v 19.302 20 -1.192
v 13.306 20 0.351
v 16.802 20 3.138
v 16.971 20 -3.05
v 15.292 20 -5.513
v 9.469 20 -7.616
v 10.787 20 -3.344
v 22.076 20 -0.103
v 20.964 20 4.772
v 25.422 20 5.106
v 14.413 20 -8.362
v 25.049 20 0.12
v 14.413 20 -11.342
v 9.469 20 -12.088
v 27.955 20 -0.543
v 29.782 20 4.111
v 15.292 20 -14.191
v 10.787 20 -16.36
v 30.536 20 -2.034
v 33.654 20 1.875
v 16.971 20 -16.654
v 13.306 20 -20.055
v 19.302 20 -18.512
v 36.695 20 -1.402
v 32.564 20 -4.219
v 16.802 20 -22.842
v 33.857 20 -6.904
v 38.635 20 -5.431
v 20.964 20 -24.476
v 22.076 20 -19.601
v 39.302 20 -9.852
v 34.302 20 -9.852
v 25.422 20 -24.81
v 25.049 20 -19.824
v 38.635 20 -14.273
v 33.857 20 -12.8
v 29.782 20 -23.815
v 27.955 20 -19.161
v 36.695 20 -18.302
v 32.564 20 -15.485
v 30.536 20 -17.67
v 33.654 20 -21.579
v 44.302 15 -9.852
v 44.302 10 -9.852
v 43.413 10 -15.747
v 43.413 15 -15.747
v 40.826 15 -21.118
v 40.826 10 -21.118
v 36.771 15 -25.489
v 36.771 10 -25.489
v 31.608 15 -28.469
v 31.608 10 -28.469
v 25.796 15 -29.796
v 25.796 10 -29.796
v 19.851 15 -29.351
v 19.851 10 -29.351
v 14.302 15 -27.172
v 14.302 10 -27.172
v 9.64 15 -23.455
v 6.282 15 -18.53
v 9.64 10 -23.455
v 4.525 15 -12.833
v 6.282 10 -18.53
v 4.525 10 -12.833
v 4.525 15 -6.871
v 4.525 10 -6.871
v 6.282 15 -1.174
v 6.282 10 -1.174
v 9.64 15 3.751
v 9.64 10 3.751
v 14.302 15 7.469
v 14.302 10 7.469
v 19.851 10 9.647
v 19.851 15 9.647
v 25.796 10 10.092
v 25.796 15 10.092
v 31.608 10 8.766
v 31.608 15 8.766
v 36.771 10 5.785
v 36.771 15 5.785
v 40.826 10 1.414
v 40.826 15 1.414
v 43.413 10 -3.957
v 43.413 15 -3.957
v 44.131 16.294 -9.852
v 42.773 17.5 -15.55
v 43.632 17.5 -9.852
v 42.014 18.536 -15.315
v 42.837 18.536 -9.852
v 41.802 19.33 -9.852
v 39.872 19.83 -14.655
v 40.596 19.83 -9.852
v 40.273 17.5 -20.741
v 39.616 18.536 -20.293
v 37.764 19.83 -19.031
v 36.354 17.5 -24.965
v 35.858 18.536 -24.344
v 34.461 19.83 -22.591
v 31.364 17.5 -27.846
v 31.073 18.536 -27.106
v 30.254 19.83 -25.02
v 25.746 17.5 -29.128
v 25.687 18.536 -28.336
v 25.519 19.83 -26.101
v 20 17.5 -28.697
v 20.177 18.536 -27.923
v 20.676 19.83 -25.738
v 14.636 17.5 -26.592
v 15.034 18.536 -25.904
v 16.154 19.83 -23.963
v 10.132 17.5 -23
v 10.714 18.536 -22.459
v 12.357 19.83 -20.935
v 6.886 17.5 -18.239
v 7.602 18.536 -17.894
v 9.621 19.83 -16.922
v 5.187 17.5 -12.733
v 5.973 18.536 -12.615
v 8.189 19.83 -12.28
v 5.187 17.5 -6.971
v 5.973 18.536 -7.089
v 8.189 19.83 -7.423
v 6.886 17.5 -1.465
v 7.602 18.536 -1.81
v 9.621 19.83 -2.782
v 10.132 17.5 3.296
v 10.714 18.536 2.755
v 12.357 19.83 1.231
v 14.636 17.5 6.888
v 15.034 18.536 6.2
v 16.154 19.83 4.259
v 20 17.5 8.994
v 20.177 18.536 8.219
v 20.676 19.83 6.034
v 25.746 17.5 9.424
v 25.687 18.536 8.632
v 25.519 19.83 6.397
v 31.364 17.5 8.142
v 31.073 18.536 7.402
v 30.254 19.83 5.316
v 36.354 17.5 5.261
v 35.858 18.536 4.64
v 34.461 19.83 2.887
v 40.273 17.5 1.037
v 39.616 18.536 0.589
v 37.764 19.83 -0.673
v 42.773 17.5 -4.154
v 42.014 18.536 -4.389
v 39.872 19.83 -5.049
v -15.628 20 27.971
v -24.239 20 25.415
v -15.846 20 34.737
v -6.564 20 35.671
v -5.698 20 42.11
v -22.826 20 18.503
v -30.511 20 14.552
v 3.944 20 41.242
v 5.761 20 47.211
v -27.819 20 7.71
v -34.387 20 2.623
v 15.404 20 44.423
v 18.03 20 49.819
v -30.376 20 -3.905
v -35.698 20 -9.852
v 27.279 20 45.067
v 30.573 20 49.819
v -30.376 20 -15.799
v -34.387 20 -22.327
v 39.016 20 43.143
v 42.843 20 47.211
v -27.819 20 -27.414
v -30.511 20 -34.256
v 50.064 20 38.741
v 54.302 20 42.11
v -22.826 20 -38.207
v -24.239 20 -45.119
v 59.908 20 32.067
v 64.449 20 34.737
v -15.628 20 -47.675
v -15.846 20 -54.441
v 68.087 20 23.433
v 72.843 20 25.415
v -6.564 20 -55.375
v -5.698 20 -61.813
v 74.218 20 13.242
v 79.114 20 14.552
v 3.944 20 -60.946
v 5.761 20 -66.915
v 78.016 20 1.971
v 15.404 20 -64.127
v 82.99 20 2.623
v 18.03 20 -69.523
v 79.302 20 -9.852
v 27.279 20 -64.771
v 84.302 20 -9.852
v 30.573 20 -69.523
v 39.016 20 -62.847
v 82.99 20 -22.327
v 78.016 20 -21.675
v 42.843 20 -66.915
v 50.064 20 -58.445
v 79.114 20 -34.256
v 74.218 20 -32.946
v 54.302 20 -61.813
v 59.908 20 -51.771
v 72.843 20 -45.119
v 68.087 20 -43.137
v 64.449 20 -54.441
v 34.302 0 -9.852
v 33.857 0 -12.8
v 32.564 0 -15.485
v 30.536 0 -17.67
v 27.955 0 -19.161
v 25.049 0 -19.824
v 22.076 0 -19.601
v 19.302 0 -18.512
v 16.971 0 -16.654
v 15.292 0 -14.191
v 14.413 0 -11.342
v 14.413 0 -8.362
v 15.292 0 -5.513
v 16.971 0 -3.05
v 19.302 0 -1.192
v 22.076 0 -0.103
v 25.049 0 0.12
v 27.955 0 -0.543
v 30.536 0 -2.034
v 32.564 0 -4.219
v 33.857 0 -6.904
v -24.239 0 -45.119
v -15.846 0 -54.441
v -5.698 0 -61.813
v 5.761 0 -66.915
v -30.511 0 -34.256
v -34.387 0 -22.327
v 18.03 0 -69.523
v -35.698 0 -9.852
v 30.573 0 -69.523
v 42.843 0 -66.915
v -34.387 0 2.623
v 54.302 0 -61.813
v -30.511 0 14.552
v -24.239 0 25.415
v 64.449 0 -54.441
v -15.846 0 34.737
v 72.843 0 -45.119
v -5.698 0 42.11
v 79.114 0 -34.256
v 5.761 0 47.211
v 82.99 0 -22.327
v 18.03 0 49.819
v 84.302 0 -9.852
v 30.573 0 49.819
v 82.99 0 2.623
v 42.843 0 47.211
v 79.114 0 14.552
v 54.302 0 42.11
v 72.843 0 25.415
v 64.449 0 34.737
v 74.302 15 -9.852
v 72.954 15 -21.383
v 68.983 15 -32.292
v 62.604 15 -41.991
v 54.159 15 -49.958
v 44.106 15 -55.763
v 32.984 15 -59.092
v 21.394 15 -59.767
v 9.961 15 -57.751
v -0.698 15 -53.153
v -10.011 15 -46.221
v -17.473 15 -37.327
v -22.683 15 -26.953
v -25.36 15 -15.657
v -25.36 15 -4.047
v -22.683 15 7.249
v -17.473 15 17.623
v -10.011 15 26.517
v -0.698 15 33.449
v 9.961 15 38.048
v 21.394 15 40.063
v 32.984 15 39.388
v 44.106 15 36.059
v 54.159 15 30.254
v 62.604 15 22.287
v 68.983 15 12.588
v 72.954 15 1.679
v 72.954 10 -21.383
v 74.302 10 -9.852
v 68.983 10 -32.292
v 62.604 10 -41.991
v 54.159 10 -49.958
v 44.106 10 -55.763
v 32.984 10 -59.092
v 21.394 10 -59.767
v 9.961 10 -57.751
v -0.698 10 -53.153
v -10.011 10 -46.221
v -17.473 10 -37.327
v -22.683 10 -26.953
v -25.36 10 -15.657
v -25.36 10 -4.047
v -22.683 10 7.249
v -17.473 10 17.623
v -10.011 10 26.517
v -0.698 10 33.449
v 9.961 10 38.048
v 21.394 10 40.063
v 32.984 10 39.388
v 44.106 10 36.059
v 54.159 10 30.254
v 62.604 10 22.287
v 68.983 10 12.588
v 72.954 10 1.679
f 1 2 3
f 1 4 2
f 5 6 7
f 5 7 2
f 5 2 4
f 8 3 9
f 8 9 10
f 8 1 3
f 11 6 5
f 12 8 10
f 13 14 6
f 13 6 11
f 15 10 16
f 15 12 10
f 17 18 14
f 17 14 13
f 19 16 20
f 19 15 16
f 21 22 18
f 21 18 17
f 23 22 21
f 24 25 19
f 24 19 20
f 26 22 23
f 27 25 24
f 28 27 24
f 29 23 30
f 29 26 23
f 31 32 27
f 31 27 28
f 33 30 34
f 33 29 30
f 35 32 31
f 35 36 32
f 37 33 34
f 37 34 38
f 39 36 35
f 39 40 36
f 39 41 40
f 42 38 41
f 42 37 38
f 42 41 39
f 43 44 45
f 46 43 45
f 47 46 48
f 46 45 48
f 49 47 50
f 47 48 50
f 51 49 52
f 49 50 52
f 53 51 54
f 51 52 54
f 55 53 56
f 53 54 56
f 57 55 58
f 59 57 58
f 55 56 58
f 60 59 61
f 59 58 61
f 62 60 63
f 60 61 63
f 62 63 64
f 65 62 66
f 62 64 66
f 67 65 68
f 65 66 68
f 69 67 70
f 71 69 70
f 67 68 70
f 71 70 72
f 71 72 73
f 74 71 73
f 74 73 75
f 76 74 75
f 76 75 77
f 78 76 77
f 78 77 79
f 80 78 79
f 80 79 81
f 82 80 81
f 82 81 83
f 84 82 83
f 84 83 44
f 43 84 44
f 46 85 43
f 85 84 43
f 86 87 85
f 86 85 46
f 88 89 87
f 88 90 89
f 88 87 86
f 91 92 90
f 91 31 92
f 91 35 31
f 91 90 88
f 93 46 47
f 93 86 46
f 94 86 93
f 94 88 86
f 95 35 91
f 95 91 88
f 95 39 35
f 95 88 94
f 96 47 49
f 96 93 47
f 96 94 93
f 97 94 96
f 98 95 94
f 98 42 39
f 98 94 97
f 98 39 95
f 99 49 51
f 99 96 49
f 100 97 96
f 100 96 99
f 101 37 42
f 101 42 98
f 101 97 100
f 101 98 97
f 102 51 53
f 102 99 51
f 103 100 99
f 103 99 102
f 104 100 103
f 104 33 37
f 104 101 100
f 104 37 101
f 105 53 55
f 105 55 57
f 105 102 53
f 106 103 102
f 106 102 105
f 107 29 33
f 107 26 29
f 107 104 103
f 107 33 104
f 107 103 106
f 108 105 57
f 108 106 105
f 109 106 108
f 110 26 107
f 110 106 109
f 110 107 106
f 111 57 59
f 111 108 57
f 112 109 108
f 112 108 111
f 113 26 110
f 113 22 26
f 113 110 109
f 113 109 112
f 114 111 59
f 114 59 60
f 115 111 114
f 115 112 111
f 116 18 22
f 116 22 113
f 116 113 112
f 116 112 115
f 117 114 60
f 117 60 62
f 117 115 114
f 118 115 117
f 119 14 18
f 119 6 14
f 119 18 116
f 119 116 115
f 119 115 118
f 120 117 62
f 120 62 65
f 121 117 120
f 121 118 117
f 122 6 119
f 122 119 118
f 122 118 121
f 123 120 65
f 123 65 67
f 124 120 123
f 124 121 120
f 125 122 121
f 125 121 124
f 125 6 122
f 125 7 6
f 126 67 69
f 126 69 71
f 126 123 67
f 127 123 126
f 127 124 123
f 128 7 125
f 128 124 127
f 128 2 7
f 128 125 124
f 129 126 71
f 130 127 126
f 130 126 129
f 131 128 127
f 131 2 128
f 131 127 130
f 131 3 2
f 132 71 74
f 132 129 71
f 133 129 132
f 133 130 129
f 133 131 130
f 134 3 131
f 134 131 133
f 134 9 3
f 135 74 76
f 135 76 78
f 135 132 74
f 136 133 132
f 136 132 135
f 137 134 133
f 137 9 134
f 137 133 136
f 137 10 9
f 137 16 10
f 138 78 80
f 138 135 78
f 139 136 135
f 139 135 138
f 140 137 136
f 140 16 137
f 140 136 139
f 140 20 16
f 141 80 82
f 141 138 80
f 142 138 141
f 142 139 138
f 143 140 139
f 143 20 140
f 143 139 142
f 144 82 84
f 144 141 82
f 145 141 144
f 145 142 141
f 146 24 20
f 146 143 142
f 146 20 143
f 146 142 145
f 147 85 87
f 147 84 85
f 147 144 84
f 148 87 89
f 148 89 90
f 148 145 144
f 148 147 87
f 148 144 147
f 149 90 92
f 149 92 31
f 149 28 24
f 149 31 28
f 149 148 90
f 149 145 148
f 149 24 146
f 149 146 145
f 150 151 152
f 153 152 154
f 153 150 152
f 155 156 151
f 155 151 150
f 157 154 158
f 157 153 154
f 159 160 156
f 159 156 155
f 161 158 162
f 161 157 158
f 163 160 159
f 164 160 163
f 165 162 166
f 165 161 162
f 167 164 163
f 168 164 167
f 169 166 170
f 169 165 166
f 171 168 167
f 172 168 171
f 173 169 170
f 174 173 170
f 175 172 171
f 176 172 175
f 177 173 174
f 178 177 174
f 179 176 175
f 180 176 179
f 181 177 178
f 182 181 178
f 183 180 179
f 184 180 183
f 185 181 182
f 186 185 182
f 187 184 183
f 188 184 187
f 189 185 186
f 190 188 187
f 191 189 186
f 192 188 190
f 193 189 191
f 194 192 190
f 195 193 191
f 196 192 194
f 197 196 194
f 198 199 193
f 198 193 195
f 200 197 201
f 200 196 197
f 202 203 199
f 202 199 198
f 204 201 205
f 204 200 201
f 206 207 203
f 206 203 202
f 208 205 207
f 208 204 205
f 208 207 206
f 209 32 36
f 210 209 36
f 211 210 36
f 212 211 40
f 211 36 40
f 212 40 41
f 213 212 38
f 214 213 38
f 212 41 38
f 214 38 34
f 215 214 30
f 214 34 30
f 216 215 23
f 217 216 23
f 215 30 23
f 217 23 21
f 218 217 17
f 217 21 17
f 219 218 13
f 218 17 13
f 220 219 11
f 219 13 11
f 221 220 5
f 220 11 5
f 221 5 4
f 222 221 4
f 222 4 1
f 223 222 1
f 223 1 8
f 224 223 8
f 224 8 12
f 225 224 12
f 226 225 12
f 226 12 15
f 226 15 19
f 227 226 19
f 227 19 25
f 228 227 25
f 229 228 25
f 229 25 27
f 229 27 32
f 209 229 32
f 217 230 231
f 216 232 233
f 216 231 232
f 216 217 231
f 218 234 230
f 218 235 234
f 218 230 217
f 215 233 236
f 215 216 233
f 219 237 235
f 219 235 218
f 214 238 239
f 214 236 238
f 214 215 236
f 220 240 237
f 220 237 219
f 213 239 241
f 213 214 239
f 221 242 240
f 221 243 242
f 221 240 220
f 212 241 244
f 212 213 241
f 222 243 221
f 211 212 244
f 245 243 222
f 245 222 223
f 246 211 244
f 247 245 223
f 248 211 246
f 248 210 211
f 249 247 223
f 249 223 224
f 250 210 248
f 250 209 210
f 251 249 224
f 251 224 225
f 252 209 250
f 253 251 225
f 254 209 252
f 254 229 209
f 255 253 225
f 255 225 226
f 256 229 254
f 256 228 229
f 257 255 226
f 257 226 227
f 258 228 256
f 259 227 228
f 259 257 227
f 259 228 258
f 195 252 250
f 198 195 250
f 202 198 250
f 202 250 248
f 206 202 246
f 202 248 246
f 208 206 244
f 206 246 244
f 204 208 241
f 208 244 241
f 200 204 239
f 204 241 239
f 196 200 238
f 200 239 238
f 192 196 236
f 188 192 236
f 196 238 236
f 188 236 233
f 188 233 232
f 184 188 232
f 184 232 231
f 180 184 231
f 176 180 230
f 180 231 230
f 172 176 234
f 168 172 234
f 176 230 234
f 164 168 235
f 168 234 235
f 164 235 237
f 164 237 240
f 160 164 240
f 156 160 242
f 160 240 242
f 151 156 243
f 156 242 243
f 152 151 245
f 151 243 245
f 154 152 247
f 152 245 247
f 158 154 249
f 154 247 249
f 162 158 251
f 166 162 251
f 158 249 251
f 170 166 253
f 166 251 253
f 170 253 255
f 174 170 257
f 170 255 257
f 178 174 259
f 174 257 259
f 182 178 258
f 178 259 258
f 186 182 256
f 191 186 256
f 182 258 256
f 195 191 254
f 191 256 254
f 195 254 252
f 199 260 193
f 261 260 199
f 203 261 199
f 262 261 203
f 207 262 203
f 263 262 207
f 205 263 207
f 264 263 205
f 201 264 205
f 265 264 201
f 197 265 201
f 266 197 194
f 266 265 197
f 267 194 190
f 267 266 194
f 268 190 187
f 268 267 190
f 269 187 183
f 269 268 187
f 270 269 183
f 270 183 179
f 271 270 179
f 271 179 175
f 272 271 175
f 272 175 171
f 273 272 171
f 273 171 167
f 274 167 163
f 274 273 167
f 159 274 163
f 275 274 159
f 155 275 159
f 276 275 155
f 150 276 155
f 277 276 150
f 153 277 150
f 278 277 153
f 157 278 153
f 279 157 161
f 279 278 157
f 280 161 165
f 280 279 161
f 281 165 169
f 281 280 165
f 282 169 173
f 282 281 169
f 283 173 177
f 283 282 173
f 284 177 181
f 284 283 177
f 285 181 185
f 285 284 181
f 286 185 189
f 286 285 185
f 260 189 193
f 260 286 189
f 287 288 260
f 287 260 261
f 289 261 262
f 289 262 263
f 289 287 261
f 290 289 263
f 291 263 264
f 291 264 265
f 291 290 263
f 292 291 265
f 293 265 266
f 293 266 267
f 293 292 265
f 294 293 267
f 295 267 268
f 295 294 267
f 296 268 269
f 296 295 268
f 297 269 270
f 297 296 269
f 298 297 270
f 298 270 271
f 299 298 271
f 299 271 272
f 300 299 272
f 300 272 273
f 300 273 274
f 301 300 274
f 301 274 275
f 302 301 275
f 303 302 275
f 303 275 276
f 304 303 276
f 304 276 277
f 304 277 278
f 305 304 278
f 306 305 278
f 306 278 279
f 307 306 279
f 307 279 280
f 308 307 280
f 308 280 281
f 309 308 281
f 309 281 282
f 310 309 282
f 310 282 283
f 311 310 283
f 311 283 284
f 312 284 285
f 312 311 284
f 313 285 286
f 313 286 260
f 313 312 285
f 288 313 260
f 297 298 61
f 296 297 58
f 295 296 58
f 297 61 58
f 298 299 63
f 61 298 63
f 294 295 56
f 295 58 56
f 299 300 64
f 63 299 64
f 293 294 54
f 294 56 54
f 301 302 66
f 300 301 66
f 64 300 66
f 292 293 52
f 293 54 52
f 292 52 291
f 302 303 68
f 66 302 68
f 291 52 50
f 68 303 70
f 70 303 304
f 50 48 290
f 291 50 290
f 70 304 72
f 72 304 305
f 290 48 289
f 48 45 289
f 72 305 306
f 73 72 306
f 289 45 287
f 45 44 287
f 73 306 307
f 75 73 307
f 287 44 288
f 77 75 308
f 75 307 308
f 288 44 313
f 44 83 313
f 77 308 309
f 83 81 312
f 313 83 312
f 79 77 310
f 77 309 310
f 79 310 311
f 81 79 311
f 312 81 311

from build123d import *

# Parameters (mm, degrees)
ESQUISSE1_R             = 20
BOSS_EXTRU_1_DEPTH      = 20
ESQUISSE1_R_2           = 60
ESQUISSE1_R_3           = 50
BOSS_EXTRU_1_2_DEPTH    = 20
ESQUISSE2_R             = 50
ESQUISSE2_R_2           = 20
BOSS_EXTRU_2_DEPTH      = 10
CHANFREIN1_SIZE         = 5
CONG_1_R                = 5
ESQUISSE3_R             = 10
ENL_V_MAT_EXTRU_1_DEPTH = 82


with BuildPart() as part:
    # Esquisse1 → Boss.-Extru.1 (new body)
    with BuildSketch(Plane(origin=(0, 0, 0), x_dir=(1, 0, 0), z_dir=(0, 1, 0))):
        with Locations((24.301532902, 9.851972798)):
            Circle(ESQUISSE1_R)
    extrude(amount=BOSS_EXTRU_1_DEPTH)



with BuildPart() as body_2:
    # Esquisse1 → Boss.-Extru.1 2 (new body)
    with BuildSketch(Plane(origin=(0, 0, 0), x_dir=(1, 0, 0), z_dir=(0, 1, 0))):
        with Locations((24.301532902, 9.851972798)):
            Circle(ESQUISSE1_R_2)
        with Locations((24.301532902, 9.851972798)):
            Circle(ESQUISSE1_R_3, mode=Mode.SUBTRACT)
    extrude(amount=BOSS_EXTRU_1_2_DEPTH)


with BuildPart() as part_1:
    add(part.part)

    add(body_2.part)  # Boss.-Extru.2 merges body 2
    # Esquisse2 → Boss.-Extru.2 (add)
    with BuildSketch(Plane.XZ):
        with Locations((24.301532902, -9.851972798)):
            Circle(ESQUISSE2_R)
        with Locations((24.301532902, -9.851972798)):
            Circle(ESQUISSE2_R_2, mode=Mode.SUBTRACT)
    extrude(amount=-BOSS_EXTRU_2_DEPTH)

    # Chanfrein1
    chanfrein1_edges = [part_1.edges().sort_by_distance(p)[0] for p in [
        (-25.698467098, 20, -9.851972798),
    ]]
    chamfer(chanfrein1_edges, length=CHANFREIN1_SIZE)

    # Congé1
    cong_1_edges = [part_1.edges().sort_by_distance(p)[0] for p in [
        (4.301532902, 20, -9.851972798),
    ]]
    fillet(cong_1_edges, radius=CONG_1_R)

    # Esquisse3 → Enlèv. mat.-Extru.1 (cut)
    with BuildSketch(Plane(origin=(0, 20, 0), x_dir=(1, 0, 0), z_dir=(0, 1, 0))):
        with Locations((24.301532902, 9.851972798)):
            Circle(ESQUISSE3_R)
    extrude(amount=-ENL_V_MAT_EXTRU_1_DEPTH, mode=Mode.SUBTRACT)


solid = part_1.part
